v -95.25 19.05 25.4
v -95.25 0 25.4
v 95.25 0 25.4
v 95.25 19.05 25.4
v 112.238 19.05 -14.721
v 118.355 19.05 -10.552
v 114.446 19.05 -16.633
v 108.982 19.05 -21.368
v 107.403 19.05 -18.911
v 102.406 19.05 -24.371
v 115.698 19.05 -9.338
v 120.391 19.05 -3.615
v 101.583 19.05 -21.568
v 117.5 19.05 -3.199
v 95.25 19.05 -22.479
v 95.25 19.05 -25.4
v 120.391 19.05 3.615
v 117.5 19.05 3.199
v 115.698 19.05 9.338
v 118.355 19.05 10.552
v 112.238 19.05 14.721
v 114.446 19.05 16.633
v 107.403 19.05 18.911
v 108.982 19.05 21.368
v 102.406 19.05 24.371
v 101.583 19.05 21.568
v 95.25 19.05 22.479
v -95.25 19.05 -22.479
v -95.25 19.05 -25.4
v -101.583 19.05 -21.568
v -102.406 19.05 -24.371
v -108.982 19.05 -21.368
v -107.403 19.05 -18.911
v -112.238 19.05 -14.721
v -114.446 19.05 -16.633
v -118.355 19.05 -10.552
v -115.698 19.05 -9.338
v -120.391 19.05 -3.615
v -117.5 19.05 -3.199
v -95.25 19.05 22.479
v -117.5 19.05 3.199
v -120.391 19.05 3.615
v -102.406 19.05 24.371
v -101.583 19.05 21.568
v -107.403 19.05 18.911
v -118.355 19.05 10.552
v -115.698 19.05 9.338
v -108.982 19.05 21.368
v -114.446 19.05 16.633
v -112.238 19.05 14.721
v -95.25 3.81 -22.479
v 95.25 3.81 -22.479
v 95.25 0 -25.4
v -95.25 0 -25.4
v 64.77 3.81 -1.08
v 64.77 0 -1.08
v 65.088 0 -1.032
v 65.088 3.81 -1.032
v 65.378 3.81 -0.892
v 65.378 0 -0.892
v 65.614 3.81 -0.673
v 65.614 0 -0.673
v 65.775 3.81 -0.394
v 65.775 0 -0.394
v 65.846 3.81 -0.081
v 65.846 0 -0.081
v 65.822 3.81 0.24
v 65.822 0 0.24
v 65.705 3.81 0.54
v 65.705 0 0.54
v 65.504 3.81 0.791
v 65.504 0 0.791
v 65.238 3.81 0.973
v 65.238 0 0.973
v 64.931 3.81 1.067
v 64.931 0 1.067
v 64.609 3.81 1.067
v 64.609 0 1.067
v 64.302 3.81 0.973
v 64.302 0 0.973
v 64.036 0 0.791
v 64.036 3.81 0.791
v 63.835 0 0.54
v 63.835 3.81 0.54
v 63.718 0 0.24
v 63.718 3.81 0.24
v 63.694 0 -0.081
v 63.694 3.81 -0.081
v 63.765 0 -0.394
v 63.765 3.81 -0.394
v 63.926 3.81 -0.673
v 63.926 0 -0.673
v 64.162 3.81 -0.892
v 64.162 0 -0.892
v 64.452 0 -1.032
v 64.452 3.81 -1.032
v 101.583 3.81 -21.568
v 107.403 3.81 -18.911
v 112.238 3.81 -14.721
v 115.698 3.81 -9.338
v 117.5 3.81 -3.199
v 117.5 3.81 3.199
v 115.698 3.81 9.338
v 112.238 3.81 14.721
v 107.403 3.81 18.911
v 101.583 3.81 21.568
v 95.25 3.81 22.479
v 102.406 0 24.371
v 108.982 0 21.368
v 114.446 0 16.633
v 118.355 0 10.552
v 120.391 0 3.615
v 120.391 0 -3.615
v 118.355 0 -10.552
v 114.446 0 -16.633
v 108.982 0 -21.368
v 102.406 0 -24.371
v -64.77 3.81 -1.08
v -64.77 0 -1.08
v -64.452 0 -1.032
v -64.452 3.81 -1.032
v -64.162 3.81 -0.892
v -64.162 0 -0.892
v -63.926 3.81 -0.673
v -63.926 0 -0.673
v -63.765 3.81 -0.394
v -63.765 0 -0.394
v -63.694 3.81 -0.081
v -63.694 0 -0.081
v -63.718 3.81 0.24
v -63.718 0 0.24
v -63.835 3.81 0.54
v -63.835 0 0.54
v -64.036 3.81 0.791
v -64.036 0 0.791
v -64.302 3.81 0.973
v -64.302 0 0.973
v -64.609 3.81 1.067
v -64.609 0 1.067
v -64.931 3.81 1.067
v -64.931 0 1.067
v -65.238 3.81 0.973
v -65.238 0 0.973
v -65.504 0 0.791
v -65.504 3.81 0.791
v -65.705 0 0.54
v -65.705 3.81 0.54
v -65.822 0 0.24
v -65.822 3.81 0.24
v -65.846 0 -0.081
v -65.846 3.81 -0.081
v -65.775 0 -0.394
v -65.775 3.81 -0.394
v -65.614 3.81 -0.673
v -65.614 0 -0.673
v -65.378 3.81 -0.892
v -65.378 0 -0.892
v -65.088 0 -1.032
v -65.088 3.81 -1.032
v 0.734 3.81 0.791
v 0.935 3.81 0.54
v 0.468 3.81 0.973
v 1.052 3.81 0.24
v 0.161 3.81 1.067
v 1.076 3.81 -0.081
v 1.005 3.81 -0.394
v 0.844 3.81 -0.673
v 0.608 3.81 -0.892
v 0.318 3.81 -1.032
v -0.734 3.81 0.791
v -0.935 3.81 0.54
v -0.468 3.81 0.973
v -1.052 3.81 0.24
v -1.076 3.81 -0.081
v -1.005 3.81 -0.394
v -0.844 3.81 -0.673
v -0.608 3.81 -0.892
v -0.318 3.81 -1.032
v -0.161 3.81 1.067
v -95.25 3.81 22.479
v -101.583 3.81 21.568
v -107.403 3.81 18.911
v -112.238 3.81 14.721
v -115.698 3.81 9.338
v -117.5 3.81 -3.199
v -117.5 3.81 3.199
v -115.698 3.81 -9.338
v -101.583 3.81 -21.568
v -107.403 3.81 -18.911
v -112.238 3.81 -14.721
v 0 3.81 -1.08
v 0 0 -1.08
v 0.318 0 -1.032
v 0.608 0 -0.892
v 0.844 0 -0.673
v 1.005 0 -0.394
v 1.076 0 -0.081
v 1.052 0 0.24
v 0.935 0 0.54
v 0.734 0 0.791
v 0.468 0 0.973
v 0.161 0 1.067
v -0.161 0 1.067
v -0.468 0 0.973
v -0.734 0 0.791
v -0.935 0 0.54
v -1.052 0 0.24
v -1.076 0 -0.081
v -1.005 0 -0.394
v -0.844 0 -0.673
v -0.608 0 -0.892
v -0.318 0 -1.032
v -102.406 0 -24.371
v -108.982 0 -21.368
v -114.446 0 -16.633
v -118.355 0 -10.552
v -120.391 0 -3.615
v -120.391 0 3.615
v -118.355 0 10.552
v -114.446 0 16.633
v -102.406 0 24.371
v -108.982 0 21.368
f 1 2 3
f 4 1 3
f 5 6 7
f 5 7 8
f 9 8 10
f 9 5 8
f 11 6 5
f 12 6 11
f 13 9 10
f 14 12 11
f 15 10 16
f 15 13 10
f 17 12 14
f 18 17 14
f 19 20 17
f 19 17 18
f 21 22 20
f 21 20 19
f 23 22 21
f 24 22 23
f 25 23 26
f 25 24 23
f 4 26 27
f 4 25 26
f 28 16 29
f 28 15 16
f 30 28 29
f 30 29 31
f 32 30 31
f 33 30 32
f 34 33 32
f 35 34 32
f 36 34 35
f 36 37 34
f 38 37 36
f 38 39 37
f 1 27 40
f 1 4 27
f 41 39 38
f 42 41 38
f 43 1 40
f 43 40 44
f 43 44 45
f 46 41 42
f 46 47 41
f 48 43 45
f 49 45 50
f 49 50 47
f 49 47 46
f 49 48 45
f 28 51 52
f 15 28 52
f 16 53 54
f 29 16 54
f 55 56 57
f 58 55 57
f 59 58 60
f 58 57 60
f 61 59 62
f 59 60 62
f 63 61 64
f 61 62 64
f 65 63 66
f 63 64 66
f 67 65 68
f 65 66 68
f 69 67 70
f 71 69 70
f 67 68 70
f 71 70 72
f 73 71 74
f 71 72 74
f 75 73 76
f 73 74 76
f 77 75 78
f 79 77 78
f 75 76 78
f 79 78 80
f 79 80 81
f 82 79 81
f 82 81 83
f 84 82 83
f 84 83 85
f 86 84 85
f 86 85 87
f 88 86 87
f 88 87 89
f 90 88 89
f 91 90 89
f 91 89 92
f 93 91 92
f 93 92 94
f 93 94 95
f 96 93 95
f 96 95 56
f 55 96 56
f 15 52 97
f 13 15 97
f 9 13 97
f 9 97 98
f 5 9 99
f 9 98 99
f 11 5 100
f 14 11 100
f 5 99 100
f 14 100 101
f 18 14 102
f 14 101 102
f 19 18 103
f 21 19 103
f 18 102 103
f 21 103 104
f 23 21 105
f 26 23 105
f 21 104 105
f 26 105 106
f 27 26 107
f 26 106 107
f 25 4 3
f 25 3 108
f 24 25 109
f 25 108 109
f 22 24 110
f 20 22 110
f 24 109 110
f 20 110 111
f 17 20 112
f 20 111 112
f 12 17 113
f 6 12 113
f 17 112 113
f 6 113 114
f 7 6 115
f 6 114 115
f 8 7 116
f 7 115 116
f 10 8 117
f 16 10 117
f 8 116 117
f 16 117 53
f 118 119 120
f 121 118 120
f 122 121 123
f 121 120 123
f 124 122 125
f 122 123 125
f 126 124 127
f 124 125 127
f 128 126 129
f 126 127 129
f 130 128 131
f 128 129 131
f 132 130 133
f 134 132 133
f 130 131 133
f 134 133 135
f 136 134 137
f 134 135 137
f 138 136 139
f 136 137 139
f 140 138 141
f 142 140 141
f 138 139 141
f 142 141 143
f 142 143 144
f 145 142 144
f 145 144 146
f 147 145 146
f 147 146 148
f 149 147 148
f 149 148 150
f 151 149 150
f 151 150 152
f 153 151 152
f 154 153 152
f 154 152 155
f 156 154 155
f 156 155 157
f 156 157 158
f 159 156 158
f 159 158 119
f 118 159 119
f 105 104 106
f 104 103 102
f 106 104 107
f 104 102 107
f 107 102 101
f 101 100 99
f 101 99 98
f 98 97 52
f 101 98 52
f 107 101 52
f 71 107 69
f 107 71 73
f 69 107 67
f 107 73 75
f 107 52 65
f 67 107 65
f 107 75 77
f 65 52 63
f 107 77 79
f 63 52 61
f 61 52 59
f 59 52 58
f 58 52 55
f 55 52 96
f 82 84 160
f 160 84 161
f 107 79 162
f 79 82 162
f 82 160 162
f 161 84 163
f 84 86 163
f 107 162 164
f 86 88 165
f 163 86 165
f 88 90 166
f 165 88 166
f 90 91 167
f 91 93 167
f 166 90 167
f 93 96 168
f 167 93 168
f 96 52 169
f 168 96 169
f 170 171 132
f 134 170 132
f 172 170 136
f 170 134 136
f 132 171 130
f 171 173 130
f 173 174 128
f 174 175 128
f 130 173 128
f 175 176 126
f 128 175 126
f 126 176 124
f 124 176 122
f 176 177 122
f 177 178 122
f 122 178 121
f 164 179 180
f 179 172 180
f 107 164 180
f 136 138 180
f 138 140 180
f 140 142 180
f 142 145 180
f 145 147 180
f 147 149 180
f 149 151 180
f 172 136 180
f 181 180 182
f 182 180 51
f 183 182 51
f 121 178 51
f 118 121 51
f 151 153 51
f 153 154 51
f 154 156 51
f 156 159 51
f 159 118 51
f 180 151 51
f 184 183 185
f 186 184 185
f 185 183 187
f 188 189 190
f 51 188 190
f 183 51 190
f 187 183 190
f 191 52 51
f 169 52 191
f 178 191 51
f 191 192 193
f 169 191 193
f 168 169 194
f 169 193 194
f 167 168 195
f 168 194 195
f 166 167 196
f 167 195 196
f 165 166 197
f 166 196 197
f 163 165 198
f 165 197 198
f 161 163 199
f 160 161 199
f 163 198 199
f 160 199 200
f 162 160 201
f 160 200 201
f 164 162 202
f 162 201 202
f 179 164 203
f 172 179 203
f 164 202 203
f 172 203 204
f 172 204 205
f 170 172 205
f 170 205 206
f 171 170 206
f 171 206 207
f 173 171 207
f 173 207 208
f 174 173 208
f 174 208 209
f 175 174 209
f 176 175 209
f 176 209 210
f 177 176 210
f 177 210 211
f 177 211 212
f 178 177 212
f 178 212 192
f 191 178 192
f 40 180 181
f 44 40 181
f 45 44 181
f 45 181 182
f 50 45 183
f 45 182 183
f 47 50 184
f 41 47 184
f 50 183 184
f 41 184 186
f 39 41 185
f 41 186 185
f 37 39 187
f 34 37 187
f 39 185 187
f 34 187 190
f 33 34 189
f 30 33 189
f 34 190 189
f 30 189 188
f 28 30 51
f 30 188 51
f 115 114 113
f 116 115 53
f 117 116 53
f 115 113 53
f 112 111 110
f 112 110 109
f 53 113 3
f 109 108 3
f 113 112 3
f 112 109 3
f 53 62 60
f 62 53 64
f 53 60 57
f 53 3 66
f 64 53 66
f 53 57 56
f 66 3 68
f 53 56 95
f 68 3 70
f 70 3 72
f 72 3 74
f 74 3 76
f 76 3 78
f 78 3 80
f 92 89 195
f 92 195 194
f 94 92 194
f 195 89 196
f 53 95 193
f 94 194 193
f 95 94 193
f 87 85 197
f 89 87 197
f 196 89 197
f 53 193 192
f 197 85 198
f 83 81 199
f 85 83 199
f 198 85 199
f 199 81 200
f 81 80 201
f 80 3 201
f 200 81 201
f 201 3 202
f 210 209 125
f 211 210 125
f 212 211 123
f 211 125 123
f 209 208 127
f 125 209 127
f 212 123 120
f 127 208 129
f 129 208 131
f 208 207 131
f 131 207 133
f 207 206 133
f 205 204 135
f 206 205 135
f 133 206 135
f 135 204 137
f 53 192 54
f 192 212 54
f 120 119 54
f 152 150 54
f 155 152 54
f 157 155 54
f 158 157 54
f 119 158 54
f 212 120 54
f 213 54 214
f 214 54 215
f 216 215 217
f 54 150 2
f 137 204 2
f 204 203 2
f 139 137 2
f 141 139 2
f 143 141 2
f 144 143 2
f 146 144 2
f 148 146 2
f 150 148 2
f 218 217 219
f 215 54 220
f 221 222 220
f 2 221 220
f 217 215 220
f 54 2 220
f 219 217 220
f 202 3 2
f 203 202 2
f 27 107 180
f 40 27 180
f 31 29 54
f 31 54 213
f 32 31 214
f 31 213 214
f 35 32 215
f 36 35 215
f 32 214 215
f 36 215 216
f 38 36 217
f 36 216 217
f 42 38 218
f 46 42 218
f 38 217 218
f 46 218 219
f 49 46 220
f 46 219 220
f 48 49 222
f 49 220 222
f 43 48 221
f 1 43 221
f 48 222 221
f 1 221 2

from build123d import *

# Parameters (mm, degrees)
MAINBLOCK_DEPTH     = 3.81
BOSS_EXTRUDE1_DEPTH = 19.05
SKETCH3_R           = 1.0795
CUT_EXTRUDE1_DEPTH  = 125.757705173


with BuildPart() as part:
    # Sketch1 → MainBlock (new body)
    with BuildSketch(Plane(origin=(0, 0, 0), x_dir=(1, 0, 0), z_dir=(0, 1, 0))):
        with BuildLine():
            Line((-95.25, 22.479), (95.25, 22.479))
            ThreePointArc((95.25, 22.479), (117.729, 0), (95.25, -22.479))
            Line((95.25, -22.479), (-95.25, -22.479))
            ThreePointArc((-95.25, -22.479), (-117.729, 0), (-95.25, 22.479))
        make_face()
    extrude(amount=MAINBLOCK_DEPTH)

    # Sketch2 → Boss-Extrude1 (add)
    with BuildSketch(Plane.XZ):
        with BuildLine():
            Line((-95.25, 25.4), (95.25, 25.4))
            ThreePointArc((95.25, 25.4), (120.65, 0), (95.25, -25.4))
            Line((95.25, -25.4), (-95.25, -25.4))
            ThreePointArc((-95.25, -25.4), (-120.65, 0), (-95.25, 25.4))
        make_face()
        with BuildLine():
            Line((95.25, 22.479), (-95.25, 22.479))
            ThreePointArc((-95.25, 22.479), (-117.729, 0), (-95.25, -22.479))
            Line((-95.25, -22.479), (95.25, -22.479))
            ThreePointArc((95.25, -22.479), (117.729, 0), (95.25, 22.479))
        make_face(mode=Mode.SUBTRACT)
    extrude(amount=-BOSS_EXTRUDE1_DEPTH)

    # Sketch3 → Cut-Extrude1 (cut, through all)
    with BuildSketch(Plane.XZ):
        with Locations(Location((0, 0, 0), (0, 0, 270))):
            Circle(SKETCH3_R)
        with Locations(Location((-64.77, 0, 0), (0, 0, 270))):
            Circle(SKETCH3_R)
        with Locations(Location((64.77, 0, 0), (0, 0, 270))):
            Circle(SKETCH3_R)
    extrude(amount=-CUT_EXTRUDE1_DEPTH, mode=Mode.SUBTRACT)


solid = part.part
